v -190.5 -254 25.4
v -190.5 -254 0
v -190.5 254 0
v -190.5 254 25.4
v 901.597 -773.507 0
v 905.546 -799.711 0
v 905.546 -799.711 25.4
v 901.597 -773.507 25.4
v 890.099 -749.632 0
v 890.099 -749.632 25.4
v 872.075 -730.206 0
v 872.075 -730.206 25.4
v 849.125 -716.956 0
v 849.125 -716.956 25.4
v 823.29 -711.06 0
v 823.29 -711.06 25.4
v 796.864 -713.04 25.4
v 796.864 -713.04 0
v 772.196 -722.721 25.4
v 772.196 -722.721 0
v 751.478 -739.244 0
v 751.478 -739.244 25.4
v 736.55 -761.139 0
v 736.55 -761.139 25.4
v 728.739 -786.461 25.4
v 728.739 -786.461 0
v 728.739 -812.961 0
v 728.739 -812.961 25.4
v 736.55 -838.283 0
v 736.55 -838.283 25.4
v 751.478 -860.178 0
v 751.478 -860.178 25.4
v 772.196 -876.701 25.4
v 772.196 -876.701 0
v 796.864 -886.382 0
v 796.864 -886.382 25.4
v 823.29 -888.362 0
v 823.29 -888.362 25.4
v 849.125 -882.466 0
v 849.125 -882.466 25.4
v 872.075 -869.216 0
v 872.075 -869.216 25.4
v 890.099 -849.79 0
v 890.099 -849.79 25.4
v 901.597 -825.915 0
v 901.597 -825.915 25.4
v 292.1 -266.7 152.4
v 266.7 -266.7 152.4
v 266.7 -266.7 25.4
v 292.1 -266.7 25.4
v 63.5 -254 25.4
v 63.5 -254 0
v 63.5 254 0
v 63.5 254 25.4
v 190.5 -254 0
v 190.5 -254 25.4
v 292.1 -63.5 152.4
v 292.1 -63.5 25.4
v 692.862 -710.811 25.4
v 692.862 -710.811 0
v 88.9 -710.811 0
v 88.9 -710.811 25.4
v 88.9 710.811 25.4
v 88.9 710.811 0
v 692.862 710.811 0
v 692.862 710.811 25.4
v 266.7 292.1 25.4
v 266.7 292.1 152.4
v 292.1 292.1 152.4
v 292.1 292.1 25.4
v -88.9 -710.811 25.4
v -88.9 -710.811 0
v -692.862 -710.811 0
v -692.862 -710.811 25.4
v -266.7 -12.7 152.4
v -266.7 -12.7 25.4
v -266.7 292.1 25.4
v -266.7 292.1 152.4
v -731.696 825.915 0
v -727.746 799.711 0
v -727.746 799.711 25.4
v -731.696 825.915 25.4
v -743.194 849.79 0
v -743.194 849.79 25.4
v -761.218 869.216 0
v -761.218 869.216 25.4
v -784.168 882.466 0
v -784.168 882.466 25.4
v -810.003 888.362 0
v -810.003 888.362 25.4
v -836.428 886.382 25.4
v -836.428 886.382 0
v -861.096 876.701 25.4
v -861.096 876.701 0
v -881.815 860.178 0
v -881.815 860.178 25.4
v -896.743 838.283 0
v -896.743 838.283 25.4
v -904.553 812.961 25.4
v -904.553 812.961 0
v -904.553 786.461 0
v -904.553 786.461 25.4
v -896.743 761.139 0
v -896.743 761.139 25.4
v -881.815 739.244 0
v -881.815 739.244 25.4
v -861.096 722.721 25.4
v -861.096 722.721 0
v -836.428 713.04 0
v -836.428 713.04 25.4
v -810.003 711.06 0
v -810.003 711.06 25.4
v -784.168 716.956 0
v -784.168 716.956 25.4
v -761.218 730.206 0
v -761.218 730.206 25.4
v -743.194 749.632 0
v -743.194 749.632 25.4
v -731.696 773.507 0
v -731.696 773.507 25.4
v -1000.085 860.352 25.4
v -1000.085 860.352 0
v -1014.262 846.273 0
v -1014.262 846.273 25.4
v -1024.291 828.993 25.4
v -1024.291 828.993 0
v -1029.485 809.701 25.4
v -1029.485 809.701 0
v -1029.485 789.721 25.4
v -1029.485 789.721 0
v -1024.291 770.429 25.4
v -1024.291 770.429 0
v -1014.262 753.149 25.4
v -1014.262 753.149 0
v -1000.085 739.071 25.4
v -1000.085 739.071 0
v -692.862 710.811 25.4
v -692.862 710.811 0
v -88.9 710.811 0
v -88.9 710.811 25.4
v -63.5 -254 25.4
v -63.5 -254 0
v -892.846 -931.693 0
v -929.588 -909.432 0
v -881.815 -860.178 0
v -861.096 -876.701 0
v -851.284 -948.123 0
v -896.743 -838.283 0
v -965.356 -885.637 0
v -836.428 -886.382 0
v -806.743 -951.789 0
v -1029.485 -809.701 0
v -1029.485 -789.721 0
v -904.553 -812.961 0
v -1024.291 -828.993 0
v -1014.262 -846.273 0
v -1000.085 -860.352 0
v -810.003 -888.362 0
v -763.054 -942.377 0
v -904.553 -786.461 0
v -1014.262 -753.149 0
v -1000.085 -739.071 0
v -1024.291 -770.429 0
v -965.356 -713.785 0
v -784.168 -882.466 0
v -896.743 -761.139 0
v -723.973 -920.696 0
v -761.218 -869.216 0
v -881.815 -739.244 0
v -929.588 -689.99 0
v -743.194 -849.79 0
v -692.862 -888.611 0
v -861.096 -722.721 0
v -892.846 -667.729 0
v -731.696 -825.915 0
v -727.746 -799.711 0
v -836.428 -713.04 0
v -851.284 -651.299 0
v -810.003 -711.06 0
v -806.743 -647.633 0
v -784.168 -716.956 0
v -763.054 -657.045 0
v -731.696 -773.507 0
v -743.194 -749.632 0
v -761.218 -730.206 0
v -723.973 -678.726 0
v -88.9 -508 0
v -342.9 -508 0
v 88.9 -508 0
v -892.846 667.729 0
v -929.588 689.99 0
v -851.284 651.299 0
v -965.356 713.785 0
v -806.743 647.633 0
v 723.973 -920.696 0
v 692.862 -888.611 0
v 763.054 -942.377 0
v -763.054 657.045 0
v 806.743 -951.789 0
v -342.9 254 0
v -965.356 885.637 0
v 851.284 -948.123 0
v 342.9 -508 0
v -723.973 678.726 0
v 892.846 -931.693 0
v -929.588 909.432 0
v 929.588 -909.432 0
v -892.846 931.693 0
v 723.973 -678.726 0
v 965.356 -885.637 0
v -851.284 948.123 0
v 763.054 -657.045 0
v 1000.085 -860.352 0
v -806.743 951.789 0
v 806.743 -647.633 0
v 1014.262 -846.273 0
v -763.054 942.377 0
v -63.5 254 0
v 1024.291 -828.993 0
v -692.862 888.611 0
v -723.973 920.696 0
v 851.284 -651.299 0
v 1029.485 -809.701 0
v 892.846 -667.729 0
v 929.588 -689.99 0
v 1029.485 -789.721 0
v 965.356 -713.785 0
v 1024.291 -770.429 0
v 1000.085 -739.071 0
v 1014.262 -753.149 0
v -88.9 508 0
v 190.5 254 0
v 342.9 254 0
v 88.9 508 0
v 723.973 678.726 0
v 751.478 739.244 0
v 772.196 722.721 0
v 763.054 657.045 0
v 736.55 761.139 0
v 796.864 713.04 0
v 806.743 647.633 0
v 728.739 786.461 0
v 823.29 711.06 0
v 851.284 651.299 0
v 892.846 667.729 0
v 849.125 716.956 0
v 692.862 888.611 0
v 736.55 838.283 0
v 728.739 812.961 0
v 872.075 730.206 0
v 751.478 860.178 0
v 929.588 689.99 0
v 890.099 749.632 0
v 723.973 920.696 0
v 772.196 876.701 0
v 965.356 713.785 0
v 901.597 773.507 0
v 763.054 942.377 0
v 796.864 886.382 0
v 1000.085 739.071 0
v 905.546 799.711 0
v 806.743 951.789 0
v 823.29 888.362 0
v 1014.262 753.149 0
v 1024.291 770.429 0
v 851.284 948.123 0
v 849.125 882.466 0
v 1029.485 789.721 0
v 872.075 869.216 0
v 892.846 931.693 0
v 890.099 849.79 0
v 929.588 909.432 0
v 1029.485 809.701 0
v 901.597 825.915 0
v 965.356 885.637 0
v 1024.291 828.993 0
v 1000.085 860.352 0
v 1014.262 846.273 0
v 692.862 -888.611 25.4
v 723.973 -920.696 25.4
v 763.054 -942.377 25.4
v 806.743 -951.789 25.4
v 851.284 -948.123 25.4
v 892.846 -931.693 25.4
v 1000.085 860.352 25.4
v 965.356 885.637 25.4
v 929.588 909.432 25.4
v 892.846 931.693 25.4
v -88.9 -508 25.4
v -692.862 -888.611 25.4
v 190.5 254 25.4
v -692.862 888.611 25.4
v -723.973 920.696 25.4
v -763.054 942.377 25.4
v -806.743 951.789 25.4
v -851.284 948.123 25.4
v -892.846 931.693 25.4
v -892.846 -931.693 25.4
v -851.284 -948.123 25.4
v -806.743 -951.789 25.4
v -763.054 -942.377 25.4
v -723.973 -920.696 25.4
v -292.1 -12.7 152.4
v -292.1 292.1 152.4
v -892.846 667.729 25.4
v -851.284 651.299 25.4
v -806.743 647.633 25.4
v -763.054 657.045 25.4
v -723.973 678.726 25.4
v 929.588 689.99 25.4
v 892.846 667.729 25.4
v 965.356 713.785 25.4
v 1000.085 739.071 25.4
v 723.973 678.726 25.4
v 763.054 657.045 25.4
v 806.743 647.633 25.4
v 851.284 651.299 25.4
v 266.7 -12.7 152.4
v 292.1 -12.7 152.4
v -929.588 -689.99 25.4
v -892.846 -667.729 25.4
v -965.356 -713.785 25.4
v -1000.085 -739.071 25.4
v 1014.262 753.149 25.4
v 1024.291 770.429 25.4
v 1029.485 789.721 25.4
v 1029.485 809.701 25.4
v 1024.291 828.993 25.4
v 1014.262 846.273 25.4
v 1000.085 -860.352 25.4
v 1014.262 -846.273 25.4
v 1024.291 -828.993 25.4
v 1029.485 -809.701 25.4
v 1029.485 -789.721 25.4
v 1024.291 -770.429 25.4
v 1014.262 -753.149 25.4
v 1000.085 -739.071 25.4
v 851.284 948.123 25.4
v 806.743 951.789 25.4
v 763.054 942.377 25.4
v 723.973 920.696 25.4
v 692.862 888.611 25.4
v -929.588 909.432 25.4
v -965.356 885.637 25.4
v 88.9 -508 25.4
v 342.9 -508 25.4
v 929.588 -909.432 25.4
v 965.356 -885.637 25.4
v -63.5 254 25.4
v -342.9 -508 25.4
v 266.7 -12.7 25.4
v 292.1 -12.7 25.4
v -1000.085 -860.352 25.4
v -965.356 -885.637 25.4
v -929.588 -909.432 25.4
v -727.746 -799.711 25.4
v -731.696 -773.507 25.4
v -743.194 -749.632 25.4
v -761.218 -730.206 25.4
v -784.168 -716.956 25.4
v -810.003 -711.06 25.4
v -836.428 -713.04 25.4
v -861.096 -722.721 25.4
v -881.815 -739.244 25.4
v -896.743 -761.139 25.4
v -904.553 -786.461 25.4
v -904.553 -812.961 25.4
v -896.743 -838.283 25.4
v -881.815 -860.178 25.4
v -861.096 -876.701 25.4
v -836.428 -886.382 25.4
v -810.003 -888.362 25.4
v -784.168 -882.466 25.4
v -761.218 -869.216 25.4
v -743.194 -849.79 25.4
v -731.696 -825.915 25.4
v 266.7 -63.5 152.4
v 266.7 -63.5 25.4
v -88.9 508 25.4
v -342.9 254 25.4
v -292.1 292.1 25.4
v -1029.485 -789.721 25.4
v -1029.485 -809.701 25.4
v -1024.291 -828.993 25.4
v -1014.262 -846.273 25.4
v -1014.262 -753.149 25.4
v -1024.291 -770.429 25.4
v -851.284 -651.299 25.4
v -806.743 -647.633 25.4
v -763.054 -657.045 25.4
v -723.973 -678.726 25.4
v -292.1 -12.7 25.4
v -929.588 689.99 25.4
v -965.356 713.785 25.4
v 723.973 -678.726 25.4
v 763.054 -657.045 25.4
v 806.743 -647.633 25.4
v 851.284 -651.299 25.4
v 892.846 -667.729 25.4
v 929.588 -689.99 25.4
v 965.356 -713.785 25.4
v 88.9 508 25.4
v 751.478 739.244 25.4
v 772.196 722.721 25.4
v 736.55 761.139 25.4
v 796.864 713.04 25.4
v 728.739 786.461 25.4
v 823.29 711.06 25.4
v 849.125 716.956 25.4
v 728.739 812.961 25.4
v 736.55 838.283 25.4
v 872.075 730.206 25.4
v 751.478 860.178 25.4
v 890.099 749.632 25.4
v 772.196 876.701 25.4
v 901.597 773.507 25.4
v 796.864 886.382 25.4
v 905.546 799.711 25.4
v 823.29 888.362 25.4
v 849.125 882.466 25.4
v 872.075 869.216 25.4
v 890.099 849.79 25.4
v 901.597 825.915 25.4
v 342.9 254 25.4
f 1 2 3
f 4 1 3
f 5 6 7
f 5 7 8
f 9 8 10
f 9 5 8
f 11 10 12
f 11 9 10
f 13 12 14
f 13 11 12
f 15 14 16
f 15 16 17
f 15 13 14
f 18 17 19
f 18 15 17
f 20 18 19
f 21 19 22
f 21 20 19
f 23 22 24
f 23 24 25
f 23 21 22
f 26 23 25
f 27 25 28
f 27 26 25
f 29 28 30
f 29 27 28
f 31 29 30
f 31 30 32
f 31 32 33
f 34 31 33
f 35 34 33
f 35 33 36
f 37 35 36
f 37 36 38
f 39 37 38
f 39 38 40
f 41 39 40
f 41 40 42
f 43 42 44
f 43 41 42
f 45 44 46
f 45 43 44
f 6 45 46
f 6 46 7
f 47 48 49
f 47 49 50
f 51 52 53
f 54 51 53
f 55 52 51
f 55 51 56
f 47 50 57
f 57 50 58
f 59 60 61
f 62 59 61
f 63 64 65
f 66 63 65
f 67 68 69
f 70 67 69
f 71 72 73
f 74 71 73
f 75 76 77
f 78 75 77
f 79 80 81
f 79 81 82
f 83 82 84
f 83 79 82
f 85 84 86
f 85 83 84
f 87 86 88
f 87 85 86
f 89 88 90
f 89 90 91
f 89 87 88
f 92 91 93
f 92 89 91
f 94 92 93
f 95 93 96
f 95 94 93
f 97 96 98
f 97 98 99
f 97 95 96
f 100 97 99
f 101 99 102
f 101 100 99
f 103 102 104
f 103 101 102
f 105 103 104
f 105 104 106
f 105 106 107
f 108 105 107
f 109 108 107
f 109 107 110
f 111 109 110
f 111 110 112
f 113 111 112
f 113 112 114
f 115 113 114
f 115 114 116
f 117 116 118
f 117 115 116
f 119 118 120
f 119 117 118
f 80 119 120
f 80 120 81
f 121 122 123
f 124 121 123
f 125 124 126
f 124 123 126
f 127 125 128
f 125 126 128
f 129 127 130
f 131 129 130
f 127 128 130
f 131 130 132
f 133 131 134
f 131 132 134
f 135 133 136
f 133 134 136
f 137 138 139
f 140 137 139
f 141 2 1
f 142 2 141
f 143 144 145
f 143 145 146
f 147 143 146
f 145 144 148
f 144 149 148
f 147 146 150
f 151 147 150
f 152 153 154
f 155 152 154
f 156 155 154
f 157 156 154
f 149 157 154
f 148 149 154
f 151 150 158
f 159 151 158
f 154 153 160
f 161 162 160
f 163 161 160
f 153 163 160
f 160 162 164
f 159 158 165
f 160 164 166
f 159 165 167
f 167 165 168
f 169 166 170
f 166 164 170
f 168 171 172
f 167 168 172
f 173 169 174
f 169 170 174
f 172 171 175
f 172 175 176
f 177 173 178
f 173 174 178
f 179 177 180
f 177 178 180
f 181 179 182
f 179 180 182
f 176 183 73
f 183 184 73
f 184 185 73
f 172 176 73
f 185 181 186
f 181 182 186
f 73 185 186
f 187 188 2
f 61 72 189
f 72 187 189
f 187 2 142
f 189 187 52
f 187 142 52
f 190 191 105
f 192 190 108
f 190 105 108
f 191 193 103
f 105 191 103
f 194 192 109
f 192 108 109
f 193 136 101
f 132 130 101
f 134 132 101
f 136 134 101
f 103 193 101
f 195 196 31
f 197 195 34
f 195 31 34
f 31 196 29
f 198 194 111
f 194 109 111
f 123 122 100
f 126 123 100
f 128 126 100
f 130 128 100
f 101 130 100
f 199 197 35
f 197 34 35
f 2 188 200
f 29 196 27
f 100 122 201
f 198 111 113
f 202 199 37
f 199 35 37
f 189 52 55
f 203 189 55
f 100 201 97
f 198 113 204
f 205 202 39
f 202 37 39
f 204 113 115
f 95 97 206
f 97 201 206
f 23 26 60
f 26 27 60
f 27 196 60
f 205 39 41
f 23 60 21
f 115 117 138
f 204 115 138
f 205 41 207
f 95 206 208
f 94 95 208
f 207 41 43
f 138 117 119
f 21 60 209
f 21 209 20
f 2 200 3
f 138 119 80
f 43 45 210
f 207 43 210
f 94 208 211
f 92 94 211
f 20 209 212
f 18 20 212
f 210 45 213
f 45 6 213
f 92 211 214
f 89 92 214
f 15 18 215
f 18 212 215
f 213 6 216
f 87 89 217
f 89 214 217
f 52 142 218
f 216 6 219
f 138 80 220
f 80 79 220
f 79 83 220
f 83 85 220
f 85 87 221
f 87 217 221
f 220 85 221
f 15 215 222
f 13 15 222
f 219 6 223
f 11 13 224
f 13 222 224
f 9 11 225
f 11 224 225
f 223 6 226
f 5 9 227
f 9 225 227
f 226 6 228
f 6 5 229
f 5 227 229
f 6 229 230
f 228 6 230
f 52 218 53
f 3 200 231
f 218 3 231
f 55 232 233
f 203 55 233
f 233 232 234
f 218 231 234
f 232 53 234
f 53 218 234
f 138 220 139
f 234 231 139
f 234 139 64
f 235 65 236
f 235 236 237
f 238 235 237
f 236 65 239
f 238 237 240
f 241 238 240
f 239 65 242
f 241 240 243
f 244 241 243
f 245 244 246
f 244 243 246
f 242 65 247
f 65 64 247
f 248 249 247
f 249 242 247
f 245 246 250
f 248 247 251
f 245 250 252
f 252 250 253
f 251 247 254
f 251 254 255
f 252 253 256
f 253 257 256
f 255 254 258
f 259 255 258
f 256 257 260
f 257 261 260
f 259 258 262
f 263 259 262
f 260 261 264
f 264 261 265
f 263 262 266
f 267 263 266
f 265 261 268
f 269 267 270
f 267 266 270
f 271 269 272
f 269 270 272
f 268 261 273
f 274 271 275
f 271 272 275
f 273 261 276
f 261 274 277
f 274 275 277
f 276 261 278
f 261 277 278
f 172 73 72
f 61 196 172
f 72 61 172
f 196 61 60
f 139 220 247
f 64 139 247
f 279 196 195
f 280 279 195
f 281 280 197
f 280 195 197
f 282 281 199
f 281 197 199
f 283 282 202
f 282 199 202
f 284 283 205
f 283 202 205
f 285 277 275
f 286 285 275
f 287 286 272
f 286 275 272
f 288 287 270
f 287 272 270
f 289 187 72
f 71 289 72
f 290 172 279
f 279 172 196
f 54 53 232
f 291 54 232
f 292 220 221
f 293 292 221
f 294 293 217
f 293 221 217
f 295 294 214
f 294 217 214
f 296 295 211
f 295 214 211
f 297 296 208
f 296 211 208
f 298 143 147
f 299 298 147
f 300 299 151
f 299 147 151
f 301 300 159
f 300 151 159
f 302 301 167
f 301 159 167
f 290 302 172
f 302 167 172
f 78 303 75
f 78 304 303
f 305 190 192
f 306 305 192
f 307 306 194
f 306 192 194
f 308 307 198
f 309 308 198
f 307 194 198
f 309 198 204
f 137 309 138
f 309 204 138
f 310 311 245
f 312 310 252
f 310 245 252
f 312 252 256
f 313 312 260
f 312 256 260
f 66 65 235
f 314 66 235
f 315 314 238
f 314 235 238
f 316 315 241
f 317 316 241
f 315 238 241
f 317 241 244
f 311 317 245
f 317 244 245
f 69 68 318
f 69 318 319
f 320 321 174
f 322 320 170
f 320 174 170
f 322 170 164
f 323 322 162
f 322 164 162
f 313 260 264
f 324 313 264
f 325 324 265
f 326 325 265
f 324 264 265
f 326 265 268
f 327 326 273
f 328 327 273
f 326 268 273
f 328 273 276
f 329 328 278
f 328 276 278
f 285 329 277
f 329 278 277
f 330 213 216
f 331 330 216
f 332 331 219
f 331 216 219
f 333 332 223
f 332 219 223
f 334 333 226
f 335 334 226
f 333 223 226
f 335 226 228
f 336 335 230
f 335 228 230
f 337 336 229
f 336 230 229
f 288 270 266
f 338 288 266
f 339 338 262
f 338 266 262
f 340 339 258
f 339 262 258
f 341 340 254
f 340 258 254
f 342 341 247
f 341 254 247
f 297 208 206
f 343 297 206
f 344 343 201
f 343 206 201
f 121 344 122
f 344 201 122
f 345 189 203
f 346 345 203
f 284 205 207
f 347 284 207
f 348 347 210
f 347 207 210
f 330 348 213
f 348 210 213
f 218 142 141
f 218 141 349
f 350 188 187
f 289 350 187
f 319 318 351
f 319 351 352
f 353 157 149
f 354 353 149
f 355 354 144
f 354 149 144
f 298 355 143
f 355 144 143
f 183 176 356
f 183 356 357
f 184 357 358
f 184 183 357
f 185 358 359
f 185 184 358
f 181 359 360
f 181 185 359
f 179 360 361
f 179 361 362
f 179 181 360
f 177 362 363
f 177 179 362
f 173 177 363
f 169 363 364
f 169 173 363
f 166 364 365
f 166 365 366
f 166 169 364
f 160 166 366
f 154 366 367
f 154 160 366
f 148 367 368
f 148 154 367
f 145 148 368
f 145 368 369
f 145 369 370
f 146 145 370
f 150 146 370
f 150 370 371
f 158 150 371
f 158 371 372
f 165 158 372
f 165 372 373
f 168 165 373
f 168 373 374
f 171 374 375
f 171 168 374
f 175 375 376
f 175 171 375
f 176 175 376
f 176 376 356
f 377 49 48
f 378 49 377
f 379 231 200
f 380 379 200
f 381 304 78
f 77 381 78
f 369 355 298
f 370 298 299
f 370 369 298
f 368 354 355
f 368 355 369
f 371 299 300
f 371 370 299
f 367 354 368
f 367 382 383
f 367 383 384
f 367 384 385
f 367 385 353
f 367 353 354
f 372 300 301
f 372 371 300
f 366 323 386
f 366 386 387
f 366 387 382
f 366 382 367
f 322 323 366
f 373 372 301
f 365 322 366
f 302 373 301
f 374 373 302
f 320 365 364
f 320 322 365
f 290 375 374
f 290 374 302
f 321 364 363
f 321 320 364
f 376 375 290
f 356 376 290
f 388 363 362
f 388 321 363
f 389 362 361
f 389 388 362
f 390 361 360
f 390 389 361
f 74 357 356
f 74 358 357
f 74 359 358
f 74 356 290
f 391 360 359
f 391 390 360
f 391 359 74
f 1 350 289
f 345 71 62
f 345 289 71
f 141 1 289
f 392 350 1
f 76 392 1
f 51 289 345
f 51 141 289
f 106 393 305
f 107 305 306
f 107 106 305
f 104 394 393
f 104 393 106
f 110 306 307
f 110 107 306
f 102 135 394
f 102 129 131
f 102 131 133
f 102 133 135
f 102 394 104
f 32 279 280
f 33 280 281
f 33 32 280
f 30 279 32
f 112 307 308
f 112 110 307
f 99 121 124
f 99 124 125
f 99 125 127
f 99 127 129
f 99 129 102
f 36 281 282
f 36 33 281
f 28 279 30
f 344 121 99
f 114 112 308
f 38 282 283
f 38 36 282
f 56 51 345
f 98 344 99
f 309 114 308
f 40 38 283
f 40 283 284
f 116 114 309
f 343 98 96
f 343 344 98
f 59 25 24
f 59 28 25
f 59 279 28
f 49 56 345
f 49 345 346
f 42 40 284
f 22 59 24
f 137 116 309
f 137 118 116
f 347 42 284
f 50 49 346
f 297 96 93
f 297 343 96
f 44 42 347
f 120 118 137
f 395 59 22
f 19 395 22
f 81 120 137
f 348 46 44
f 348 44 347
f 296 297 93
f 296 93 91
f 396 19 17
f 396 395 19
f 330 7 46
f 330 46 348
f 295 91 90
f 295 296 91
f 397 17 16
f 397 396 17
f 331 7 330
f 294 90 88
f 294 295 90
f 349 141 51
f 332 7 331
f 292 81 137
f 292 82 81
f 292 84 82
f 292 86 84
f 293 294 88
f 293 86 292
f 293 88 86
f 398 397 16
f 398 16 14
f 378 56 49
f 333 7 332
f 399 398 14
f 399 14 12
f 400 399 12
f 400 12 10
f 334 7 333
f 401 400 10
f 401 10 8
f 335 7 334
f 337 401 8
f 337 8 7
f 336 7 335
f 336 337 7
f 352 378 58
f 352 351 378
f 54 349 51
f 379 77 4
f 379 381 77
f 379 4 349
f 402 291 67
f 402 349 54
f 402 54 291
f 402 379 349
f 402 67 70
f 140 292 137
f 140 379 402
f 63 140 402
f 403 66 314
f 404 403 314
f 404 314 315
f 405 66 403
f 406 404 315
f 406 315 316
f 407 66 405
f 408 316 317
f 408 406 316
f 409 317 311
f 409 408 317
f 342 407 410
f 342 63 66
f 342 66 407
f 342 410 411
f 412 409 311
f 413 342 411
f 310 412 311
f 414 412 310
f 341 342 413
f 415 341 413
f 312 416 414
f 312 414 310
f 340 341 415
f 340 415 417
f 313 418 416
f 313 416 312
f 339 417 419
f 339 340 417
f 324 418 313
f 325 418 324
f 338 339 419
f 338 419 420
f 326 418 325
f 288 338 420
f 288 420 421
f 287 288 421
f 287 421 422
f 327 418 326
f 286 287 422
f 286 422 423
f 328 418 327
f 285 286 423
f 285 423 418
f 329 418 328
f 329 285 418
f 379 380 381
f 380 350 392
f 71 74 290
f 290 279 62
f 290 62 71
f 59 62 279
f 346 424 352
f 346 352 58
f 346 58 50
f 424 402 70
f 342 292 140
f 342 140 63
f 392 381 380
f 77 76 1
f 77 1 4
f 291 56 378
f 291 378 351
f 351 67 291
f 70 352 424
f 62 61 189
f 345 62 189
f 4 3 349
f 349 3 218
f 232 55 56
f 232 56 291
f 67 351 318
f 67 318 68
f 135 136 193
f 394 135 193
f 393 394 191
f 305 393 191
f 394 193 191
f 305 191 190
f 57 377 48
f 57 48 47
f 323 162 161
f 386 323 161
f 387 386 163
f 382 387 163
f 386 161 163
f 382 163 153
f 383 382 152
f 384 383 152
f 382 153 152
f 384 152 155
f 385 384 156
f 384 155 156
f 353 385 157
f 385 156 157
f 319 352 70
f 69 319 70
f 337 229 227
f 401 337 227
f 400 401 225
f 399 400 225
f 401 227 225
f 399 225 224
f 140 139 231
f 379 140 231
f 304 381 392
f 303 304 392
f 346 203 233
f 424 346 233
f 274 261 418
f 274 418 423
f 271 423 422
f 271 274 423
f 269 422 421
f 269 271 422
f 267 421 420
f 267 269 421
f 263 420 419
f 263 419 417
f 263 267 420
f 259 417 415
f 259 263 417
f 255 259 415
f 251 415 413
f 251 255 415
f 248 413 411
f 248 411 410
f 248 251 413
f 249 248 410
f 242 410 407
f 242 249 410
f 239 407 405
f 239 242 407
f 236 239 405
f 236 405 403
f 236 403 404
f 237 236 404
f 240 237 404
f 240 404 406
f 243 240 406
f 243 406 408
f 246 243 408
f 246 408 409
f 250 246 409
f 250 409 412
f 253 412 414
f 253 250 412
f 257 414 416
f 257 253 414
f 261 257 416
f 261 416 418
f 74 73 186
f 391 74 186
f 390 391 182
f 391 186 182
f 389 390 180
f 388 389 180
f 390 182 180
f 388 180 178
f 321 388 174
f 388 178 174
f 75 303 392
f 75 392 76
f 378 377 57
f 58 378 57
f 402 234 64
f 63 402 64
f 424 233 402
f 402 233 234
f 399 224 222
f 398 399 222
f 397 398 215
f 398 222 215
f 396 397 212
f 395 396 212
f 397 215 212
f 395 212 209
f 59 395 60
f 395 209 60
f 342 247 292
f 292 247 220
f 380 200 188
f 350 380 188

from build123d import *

# Parameters (mm, degrees)
F0_R     = 88.9
F0_W     = 127
F0_H     = 508
F1_DEPTH = 25.4
F2_W     = 25.4
F2_H     = 12.7
F2_H_2   = 292.1
F2_H_3   = 304.8
F2_H_4   = 203.2
F3_DEPTH = 127


with BuildPart() as f1:
    # F0 (on Top) → F1 (new body)
    with BuildSketch(Plane.XY):
        with BuildLine():
            ThreePointArc((-1000.085346, 739.070513), (-947.597523, 701.69854), (-892.846368, 667.728745))
            ThreePointArc((-892.846368, 667.728745), (-784.551405, 650.728892), (-692.86208, 710.811016))
            Line((-692.86208, 710.811016), (-88.9, 710.811016))
            Line((-88.9, 710.811016), (-88.9, 508))
            Line((-88.9, 508), (-342.9, 254))
            Line((-342.9, 254), (-342.9, -508))
            Line((-342.9, -508), (-88.9, -508))
            Line((-88.9, -508), (-88.9, -710.811016))
            Line((-88.9, -710.811016), (-692.86208, -710.811016))
            ThreePointArc((-692.86208, -710.811016), (-784.551405, -650.728892), (-892.846368, -667.728745))
            ThreePointArc((-892.846368, -667.728745), (-947.597523, -701.69854), (-1000.085346, -739.070513))
            ThreePointArc((-1000.085346, -739.070513), (-1030.142423, -799.711016), (-1000.085346, -860.35152))
            ThreePointArc((-1000.085346, -860.35152), (-947.597523, -897.723493), (-892.846368, -931.693288))
            ThreePointArc((-892.846368, -931.693288), (-784.551405, -948.693141), (-692.86208, -888.611016))
            Line((-692.86208, -888.611016), (692.86208, -888.611016))
            ThreePointArc((692.86208, -888.611016), (784.551405, -948.693141), (892.846368, -931.693288))
            ThreePointArc((892.846368, -931.693288), (947.597523, -897.723493), (1000.085346, -860.35152))
            ThreePointArc((1000.085346, -860.35152), (1030.142423, -799.711016), (1000.085346, -739.070513))
            ThreePointArc((1000.085346, -739.070513), (947.597523, -701.69854), (892.846368, -667.728745))
            ThreePointArc((892.846368, -667.728745), (784.551405, -650.728892), (692.86208, -710.811016))
            Line((692.86208, -710.811016), (88.9, -710.811016))
            Line((88.9, -710.811016), (88.9, -508))
            Line((88.9, -508), (342.9, -508))
            Line((342.9, -508), (342.9, 254))
            Line((342.9, 254), (88.9, 508))
            Line((88.9, 508), (88.9, 710.811016))
            Line((88.9, 710.811016), (692.86208, 710.811016))
            ThreePointArc((692.86208, 710.811016), (784.551405, 650.728892), (892.846368, 667.728745))
            ThreePointArc((892.846368, 667.728745), (947.597523, 701.69854), (1000.085346, 739.070513))
            ThreePointArc((1000.085346, 739.070513), (1030.142423, 799.711016), (1000.085346, 860.35152))
            ThreePointArc((1000.085346, 860.35152), (947.597523, 897.723493), (892.846368, 931.693288))
            ThreePointArc((892.846368, 931.693288), (784.551405, 948.693141), (692.86208, 888.611016))
            Line((692.86208, 888.611016), (-692.86208, 888.611016))
            ThreePointArc((-692.86208, 888.611016), (-784.551405, 948.693141), (-892.846368, 931.693288))
            ThreePointArc((-892.846368, 931.693288), (-947.597523, 897.723493), (-1000.085346, 860.35152))
            ThreePointArc((-1000.085346, 860.35152), (-1030.142423, 799.711016), (-1000.085346, 739.070513))
        make_face()
        with Locations((-816.646368, -799.711016)):
            Circle(F0_R, mode=Mode.SUBTRACT)
        with Locations((-127, 0)):
            Rectangle(F0_W, F0_H, mode=Mode.SUBTRACT)
        with Locations((816.646368, -799.711016)):
            Circle(F0_R, mode=Mode.SUBTRACT)
        with Locations((127, 0)):
            Rectangle(F0_W, F0_H, mode=Mode.SUBTRACT)
        with Locations((-816.646368, 799.711016)):
            Circle(F0_R, mode=Mode.SUBTRACT)
        with Locations((816.646368, 799.711016)):
            Circle(F0_R, mode=Mode.SUBTRACT)
    extrude(amount=F1_DEPTH)

    # F2 (on face) → F3 (join)
    with BuildSketch(Plane.XY.offset(25.4)):
        with Locations((-279.4, -6.35)):
            Rectangle(F2_W, F2_H)
        with Locations((-279.4, 146.05)):
            Rectangle(F2_W, F2_H_2)
        with Locations((279.4, 139.7)):
            Rectangle(F2_W, F2_H_3)
        with Locations((279.4, -165.1)):
            Rectangle(F2_W, F2_H_4)
    extrude(amount=F3_DEPTH)


solid = f1.part
